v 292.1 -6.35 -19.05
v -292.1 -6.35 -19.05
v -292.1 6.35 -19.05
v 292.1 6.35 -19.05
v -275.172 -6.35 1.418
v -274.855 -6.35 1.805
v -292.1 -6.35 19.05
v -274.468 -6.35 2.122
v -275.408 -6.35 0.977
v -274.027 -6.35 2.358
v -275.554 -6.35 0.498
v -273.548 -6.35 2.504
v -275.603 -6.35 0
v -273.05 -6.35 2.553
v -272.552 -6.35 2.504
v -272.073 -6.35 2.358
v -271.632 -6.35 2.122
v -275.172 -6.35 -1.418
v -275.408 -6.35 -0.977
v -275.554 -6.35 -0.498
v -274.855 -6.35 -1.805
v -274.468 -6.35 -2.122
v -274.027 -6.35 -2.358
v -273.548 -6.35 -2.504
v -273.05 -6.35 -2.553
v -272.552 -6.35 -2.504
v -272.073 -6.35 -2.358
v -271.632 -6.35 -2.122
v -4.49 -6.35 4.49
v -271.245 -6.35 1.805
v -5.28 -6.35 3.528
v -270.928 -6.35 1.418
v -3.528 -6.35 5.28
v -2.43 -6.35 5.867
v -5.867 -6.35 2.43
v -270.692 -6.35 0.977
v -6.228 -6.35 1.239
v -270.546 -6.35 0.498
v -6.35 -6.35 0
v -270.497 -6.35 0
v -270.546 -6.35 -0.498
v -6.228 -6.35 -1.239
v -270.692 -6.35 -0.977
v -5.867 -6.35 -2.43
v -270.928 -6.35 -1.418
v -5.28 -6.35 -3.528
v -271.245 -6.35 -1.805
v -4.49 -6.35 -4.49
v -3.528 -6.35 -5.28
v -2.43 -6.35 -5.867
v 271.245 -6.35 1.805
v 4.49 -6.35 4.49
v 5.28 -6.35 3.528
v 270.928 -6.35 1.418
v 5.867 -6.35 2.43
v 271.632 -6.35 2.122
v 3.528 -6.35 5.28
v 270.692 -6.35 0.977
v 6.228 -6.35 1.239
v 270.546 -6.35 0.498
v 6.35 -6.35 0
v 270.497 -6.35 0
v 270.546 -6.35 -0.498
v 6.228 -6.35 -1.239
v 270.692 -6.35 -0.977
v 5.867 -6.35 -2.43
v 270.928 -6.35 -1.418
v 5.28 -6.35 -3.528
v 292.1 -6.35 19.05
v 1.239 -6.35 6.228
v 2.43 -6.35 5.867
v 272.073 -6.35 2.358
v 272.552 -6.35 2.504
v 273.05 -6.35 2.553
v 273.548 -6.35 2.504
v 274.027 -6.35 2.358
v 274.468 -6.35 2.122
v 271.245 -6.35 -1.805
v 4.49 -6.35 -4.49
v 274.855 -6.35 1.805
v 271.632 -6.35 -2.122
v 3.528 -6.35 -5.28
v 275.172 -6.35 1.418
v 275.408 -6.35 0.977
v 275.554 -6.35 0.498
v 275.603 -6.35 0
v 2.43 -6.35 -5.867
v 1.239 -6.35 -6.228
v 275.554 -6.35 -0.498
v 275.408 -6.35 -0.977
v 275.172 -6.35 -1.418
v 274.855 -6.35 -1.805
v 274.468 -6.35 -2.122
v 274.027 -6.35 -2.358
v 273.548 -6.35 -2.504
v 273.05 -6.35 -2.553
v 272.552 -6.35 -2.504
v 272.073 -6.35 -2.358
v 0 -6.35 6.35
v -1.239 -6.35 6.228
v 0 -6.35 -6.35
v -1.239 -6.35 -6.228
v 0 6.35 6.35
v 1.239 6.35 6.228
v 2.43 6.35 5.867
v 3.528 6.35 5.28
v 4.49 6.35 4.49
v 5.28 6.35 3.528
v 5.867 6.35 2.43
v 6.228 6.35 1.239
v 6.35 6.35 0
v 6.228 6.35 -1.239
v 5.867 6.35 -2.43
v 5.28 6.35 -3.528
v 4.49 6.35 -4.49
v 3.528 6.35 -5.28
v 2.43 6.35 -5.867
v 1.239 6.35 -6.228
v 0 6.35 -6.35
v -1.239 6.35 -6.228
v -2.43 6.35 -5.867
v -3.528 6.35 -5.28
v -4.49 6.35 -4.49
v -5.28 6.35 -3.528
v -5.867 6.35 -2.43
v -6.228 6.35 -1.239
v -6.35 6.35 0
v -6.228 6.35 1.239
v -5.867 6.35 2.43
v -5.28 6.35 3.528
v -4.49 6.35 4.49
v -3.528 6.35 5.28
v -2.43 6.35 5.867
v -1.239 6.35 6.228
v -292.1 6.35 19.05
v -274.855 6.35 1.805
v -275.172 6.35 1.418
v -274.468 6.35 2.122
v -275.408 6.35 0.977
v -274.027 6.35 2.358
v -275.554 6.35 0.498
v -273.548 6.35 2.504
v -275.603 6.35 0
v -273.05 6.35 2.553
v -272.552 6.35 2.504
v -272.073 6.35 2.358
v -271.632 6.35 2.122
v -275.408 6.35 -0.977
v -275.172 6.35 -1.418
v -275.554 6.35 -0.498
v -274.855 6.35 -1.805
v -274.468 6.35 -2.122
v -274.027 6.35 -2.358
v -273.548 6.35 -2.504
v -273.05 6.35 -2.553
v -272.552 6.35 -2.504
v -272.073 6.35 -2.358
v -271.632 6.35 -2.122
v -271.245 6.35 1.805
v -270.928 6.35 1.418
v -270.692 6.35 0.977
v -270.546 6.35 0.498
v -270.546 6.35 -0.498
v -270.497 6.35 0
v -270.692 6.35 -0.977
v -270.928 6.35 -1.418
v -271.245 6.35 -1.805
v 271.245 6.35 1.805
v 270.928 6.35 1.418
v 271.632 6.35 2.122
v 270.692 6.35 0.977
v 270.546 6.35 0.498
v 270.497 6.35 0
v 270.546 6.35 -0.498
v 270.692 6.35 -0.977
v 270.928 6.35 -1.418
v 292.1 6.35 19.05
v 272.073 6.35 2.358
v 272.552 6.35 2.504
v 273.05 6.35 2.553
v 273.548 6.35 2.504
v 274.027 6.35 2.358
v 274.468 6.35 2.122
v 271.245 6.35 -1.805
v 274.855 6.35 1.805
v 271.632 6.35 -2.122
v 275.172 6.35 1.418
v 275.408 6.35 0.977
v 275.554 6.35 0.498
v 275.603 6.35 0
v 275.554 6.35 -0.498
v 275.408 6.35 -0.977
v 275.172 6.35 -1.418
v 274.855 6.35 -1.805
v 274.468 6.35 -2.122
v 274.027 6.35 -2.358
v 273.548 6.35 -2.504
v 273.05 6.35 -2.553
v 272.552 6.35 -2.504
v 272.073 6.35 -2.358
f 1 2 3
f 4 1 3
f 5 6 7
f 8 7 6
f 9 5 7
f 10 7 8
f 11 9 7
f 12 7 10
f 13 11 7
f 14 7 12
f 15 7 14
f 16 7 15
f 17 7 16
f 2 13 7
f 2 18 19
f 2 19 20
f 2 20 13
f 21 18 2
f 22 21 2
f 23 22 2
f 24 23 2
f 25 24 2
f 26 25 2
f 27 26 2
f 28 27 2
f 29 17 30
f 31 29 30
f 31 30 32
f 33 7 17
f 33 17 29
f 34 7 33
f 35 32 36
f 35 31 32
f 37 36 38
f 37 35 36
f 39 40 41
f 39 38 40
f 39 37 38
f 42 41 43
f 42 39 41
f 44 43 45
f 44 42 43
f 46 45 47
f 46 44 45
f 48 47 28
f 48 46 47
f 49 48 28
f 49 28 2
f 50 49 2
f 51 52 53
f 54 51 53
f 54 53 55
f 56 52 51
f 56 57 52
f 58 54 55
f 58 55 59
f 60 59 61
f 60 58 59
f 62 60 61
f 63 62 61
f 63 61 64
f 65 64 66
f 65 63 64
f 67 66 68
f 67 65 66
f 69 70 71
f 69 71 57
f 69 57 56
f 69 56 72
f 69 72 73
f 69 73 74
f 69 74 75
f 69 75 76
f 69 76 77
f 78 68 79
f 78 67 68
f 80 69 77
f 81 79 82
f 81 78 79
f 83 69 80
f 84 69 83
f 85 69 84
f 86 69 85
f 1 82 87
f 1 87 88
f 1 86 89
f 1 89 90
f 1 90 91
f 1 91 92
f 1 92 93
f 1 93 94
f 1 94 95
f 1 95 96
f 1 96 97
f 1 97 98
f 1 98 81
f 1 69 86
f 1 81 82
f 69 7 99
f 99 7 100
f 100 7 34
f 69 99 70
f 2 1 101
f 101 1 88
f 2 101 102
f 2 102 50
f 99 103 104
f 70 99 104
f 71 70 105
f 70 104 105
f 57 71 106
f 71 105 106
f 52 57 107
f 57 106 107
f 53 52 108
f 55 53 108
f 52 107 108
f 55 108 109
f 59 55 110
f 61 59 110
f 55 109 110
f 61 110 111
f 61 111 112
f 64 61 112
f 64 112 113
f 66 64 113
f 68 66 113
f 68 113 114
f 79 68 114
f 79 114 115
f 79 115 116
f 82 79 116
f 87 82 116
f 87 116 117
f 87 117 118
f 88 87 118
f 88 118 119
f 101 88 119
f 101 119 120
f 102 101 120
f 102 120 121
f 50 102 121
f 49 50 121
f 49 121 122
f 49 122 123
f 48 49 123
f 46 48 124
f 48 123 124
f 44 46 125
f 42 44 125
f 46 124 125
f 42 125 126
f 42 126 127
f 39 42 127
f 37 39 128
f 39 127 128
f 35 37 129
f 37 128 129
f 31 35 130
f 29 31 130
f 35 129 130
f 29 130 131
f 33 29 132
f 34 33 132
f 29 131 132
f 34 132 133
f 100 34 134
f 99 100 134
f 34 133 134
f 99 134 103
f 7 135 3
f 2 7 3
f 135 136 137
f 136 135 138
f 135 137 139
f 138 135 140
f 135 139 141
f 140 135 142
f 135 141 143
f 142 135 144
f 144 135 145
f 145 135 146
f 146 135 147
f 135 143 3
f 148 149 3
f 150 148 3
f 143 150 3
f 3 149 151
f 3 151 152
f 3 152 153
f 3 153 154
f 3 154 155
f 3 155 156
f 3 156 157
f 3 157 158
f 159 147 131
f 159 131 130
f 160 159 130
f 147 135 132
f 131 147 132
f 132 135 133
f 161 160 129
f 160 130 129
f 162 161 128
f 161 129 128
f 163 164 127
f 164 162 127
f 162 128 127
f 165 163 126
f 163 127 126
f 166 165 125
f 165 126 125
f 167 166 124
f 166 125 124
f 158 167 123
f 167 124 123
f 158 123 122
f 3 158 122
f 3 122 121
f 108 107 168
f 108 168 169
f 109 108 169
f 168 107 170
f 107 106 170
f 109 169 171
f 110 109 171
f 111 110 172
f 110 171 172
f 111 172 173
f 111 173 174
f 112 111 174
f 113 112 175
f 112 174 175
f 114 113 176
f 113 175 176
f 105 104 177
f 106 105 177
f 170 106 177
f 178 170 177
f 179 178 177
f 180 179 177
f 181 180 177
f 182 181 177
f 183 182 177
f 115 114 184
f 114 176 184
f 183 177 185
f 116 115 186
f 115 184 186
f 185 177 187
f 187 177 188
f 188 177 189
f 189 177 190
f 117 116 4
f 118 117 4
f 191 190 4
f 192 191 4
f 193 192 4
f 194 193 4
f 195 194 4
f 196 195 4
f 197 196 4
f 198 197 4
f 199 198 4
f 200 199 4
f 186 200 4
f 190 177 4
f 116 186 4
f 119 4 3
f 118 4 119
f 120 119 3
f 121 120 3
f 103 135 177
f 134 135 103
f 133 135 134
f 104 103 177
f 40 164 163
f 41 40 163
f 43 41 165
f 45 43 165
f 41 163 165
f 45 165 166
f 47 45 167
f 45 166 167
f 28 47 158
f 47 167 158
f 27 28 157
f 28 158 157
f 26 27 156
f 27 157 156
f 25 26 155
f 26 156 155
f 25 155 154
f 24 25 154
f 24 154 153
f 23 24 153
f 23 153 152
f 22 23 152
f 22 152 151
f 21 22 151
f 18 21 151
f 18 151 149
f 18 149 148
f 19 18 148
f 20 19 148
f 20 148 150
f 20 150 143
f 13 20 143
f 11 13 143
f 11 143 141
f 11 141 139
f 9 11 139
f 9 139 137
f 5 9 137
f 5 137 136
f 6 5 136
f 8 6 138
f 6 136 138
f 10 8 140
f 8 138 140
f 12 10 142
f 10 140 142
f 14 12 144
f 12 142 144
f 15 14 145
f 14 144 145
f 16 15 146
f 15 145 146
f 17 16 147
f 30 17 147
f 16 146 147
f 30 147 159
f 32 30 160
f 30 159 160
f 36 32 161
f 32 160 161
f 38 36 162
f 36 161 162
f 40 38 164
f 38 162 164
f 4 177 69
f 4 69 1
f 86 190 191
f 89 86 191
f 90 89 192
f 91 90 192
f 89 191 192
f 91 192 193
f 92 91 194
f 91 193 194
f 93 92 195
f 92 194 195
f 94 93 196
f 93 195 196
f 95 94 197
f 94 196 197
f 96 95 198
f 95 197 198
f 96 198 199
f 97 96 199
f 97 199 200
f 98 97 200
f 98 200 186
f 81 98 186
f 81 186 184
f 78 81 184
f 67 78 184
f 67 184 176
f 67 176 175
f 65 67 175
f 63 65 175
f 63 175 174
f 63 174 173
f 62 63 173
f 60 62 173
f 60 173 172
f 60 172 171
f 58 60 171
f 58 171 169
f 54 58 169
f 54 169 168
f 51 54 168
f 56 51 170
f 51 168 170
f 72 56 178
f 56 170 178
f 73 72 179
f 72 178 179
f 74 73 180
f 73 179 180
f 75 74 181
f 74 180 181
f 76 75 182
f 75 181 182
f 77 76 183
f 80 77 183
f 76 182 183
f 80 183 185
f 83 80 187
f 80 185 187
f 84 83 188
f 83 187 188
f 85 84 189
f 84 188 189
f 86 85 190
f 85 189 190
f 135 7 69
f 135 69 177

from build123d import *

# Parameters (mm, degrees)
SKETCH1_W               = 38.1
SKETCH1_H               = 12.7
BOSS_EXTRUDE1_DEPTH     = 292.1
SKETCH2_R               = 6.35
CUT_EXTRUDE1_DEPTH      = 293.995908675
F_1_4_20_TAPPED_HOLE1_D = 5.1054


with BuildPart() as part:
    # Sketch1 → Boss-Extrude1 (new, symmetric)
    with BuildSketch(Plane(origin=(0, 0, 0), x_dir=(0, 0, -1), z_dir=(1, 0, 0))):
        Rectangle(SKETCH1_W, SKETCH1_H)
    extrude(amount=BOSS_EXTRUDE1_DEPTH, both=True)

    # Sketch2 → Cut-Extrude1 (cut, through all)
    with BuildSketch(Plane(origin=(0, 6.35, 0), x_dir=(1, 0, 0), z_dir=(0, 1, 0))):
        with Locations(Location((0, 0, 0), (0, 0, 270))):
            Circle(SKETCH2_R)
    extrude(amount=-CUT_EXTRUDE1_DEPTH, mode=Mode.SUBTRACT)

    # 1/4-20 Tapped Hole1 (through all)
    with Locations(Plane(origin=(0, -6.35, 0), x_dir=(-1, 0, 0), z_dir=(0, -1, 0))):
        with Locations((273.05, 0), (-273.05, 0)):
            Hole(F_1_4_20_TAPPED_HOLE1_D / 2)


solid = part.part
